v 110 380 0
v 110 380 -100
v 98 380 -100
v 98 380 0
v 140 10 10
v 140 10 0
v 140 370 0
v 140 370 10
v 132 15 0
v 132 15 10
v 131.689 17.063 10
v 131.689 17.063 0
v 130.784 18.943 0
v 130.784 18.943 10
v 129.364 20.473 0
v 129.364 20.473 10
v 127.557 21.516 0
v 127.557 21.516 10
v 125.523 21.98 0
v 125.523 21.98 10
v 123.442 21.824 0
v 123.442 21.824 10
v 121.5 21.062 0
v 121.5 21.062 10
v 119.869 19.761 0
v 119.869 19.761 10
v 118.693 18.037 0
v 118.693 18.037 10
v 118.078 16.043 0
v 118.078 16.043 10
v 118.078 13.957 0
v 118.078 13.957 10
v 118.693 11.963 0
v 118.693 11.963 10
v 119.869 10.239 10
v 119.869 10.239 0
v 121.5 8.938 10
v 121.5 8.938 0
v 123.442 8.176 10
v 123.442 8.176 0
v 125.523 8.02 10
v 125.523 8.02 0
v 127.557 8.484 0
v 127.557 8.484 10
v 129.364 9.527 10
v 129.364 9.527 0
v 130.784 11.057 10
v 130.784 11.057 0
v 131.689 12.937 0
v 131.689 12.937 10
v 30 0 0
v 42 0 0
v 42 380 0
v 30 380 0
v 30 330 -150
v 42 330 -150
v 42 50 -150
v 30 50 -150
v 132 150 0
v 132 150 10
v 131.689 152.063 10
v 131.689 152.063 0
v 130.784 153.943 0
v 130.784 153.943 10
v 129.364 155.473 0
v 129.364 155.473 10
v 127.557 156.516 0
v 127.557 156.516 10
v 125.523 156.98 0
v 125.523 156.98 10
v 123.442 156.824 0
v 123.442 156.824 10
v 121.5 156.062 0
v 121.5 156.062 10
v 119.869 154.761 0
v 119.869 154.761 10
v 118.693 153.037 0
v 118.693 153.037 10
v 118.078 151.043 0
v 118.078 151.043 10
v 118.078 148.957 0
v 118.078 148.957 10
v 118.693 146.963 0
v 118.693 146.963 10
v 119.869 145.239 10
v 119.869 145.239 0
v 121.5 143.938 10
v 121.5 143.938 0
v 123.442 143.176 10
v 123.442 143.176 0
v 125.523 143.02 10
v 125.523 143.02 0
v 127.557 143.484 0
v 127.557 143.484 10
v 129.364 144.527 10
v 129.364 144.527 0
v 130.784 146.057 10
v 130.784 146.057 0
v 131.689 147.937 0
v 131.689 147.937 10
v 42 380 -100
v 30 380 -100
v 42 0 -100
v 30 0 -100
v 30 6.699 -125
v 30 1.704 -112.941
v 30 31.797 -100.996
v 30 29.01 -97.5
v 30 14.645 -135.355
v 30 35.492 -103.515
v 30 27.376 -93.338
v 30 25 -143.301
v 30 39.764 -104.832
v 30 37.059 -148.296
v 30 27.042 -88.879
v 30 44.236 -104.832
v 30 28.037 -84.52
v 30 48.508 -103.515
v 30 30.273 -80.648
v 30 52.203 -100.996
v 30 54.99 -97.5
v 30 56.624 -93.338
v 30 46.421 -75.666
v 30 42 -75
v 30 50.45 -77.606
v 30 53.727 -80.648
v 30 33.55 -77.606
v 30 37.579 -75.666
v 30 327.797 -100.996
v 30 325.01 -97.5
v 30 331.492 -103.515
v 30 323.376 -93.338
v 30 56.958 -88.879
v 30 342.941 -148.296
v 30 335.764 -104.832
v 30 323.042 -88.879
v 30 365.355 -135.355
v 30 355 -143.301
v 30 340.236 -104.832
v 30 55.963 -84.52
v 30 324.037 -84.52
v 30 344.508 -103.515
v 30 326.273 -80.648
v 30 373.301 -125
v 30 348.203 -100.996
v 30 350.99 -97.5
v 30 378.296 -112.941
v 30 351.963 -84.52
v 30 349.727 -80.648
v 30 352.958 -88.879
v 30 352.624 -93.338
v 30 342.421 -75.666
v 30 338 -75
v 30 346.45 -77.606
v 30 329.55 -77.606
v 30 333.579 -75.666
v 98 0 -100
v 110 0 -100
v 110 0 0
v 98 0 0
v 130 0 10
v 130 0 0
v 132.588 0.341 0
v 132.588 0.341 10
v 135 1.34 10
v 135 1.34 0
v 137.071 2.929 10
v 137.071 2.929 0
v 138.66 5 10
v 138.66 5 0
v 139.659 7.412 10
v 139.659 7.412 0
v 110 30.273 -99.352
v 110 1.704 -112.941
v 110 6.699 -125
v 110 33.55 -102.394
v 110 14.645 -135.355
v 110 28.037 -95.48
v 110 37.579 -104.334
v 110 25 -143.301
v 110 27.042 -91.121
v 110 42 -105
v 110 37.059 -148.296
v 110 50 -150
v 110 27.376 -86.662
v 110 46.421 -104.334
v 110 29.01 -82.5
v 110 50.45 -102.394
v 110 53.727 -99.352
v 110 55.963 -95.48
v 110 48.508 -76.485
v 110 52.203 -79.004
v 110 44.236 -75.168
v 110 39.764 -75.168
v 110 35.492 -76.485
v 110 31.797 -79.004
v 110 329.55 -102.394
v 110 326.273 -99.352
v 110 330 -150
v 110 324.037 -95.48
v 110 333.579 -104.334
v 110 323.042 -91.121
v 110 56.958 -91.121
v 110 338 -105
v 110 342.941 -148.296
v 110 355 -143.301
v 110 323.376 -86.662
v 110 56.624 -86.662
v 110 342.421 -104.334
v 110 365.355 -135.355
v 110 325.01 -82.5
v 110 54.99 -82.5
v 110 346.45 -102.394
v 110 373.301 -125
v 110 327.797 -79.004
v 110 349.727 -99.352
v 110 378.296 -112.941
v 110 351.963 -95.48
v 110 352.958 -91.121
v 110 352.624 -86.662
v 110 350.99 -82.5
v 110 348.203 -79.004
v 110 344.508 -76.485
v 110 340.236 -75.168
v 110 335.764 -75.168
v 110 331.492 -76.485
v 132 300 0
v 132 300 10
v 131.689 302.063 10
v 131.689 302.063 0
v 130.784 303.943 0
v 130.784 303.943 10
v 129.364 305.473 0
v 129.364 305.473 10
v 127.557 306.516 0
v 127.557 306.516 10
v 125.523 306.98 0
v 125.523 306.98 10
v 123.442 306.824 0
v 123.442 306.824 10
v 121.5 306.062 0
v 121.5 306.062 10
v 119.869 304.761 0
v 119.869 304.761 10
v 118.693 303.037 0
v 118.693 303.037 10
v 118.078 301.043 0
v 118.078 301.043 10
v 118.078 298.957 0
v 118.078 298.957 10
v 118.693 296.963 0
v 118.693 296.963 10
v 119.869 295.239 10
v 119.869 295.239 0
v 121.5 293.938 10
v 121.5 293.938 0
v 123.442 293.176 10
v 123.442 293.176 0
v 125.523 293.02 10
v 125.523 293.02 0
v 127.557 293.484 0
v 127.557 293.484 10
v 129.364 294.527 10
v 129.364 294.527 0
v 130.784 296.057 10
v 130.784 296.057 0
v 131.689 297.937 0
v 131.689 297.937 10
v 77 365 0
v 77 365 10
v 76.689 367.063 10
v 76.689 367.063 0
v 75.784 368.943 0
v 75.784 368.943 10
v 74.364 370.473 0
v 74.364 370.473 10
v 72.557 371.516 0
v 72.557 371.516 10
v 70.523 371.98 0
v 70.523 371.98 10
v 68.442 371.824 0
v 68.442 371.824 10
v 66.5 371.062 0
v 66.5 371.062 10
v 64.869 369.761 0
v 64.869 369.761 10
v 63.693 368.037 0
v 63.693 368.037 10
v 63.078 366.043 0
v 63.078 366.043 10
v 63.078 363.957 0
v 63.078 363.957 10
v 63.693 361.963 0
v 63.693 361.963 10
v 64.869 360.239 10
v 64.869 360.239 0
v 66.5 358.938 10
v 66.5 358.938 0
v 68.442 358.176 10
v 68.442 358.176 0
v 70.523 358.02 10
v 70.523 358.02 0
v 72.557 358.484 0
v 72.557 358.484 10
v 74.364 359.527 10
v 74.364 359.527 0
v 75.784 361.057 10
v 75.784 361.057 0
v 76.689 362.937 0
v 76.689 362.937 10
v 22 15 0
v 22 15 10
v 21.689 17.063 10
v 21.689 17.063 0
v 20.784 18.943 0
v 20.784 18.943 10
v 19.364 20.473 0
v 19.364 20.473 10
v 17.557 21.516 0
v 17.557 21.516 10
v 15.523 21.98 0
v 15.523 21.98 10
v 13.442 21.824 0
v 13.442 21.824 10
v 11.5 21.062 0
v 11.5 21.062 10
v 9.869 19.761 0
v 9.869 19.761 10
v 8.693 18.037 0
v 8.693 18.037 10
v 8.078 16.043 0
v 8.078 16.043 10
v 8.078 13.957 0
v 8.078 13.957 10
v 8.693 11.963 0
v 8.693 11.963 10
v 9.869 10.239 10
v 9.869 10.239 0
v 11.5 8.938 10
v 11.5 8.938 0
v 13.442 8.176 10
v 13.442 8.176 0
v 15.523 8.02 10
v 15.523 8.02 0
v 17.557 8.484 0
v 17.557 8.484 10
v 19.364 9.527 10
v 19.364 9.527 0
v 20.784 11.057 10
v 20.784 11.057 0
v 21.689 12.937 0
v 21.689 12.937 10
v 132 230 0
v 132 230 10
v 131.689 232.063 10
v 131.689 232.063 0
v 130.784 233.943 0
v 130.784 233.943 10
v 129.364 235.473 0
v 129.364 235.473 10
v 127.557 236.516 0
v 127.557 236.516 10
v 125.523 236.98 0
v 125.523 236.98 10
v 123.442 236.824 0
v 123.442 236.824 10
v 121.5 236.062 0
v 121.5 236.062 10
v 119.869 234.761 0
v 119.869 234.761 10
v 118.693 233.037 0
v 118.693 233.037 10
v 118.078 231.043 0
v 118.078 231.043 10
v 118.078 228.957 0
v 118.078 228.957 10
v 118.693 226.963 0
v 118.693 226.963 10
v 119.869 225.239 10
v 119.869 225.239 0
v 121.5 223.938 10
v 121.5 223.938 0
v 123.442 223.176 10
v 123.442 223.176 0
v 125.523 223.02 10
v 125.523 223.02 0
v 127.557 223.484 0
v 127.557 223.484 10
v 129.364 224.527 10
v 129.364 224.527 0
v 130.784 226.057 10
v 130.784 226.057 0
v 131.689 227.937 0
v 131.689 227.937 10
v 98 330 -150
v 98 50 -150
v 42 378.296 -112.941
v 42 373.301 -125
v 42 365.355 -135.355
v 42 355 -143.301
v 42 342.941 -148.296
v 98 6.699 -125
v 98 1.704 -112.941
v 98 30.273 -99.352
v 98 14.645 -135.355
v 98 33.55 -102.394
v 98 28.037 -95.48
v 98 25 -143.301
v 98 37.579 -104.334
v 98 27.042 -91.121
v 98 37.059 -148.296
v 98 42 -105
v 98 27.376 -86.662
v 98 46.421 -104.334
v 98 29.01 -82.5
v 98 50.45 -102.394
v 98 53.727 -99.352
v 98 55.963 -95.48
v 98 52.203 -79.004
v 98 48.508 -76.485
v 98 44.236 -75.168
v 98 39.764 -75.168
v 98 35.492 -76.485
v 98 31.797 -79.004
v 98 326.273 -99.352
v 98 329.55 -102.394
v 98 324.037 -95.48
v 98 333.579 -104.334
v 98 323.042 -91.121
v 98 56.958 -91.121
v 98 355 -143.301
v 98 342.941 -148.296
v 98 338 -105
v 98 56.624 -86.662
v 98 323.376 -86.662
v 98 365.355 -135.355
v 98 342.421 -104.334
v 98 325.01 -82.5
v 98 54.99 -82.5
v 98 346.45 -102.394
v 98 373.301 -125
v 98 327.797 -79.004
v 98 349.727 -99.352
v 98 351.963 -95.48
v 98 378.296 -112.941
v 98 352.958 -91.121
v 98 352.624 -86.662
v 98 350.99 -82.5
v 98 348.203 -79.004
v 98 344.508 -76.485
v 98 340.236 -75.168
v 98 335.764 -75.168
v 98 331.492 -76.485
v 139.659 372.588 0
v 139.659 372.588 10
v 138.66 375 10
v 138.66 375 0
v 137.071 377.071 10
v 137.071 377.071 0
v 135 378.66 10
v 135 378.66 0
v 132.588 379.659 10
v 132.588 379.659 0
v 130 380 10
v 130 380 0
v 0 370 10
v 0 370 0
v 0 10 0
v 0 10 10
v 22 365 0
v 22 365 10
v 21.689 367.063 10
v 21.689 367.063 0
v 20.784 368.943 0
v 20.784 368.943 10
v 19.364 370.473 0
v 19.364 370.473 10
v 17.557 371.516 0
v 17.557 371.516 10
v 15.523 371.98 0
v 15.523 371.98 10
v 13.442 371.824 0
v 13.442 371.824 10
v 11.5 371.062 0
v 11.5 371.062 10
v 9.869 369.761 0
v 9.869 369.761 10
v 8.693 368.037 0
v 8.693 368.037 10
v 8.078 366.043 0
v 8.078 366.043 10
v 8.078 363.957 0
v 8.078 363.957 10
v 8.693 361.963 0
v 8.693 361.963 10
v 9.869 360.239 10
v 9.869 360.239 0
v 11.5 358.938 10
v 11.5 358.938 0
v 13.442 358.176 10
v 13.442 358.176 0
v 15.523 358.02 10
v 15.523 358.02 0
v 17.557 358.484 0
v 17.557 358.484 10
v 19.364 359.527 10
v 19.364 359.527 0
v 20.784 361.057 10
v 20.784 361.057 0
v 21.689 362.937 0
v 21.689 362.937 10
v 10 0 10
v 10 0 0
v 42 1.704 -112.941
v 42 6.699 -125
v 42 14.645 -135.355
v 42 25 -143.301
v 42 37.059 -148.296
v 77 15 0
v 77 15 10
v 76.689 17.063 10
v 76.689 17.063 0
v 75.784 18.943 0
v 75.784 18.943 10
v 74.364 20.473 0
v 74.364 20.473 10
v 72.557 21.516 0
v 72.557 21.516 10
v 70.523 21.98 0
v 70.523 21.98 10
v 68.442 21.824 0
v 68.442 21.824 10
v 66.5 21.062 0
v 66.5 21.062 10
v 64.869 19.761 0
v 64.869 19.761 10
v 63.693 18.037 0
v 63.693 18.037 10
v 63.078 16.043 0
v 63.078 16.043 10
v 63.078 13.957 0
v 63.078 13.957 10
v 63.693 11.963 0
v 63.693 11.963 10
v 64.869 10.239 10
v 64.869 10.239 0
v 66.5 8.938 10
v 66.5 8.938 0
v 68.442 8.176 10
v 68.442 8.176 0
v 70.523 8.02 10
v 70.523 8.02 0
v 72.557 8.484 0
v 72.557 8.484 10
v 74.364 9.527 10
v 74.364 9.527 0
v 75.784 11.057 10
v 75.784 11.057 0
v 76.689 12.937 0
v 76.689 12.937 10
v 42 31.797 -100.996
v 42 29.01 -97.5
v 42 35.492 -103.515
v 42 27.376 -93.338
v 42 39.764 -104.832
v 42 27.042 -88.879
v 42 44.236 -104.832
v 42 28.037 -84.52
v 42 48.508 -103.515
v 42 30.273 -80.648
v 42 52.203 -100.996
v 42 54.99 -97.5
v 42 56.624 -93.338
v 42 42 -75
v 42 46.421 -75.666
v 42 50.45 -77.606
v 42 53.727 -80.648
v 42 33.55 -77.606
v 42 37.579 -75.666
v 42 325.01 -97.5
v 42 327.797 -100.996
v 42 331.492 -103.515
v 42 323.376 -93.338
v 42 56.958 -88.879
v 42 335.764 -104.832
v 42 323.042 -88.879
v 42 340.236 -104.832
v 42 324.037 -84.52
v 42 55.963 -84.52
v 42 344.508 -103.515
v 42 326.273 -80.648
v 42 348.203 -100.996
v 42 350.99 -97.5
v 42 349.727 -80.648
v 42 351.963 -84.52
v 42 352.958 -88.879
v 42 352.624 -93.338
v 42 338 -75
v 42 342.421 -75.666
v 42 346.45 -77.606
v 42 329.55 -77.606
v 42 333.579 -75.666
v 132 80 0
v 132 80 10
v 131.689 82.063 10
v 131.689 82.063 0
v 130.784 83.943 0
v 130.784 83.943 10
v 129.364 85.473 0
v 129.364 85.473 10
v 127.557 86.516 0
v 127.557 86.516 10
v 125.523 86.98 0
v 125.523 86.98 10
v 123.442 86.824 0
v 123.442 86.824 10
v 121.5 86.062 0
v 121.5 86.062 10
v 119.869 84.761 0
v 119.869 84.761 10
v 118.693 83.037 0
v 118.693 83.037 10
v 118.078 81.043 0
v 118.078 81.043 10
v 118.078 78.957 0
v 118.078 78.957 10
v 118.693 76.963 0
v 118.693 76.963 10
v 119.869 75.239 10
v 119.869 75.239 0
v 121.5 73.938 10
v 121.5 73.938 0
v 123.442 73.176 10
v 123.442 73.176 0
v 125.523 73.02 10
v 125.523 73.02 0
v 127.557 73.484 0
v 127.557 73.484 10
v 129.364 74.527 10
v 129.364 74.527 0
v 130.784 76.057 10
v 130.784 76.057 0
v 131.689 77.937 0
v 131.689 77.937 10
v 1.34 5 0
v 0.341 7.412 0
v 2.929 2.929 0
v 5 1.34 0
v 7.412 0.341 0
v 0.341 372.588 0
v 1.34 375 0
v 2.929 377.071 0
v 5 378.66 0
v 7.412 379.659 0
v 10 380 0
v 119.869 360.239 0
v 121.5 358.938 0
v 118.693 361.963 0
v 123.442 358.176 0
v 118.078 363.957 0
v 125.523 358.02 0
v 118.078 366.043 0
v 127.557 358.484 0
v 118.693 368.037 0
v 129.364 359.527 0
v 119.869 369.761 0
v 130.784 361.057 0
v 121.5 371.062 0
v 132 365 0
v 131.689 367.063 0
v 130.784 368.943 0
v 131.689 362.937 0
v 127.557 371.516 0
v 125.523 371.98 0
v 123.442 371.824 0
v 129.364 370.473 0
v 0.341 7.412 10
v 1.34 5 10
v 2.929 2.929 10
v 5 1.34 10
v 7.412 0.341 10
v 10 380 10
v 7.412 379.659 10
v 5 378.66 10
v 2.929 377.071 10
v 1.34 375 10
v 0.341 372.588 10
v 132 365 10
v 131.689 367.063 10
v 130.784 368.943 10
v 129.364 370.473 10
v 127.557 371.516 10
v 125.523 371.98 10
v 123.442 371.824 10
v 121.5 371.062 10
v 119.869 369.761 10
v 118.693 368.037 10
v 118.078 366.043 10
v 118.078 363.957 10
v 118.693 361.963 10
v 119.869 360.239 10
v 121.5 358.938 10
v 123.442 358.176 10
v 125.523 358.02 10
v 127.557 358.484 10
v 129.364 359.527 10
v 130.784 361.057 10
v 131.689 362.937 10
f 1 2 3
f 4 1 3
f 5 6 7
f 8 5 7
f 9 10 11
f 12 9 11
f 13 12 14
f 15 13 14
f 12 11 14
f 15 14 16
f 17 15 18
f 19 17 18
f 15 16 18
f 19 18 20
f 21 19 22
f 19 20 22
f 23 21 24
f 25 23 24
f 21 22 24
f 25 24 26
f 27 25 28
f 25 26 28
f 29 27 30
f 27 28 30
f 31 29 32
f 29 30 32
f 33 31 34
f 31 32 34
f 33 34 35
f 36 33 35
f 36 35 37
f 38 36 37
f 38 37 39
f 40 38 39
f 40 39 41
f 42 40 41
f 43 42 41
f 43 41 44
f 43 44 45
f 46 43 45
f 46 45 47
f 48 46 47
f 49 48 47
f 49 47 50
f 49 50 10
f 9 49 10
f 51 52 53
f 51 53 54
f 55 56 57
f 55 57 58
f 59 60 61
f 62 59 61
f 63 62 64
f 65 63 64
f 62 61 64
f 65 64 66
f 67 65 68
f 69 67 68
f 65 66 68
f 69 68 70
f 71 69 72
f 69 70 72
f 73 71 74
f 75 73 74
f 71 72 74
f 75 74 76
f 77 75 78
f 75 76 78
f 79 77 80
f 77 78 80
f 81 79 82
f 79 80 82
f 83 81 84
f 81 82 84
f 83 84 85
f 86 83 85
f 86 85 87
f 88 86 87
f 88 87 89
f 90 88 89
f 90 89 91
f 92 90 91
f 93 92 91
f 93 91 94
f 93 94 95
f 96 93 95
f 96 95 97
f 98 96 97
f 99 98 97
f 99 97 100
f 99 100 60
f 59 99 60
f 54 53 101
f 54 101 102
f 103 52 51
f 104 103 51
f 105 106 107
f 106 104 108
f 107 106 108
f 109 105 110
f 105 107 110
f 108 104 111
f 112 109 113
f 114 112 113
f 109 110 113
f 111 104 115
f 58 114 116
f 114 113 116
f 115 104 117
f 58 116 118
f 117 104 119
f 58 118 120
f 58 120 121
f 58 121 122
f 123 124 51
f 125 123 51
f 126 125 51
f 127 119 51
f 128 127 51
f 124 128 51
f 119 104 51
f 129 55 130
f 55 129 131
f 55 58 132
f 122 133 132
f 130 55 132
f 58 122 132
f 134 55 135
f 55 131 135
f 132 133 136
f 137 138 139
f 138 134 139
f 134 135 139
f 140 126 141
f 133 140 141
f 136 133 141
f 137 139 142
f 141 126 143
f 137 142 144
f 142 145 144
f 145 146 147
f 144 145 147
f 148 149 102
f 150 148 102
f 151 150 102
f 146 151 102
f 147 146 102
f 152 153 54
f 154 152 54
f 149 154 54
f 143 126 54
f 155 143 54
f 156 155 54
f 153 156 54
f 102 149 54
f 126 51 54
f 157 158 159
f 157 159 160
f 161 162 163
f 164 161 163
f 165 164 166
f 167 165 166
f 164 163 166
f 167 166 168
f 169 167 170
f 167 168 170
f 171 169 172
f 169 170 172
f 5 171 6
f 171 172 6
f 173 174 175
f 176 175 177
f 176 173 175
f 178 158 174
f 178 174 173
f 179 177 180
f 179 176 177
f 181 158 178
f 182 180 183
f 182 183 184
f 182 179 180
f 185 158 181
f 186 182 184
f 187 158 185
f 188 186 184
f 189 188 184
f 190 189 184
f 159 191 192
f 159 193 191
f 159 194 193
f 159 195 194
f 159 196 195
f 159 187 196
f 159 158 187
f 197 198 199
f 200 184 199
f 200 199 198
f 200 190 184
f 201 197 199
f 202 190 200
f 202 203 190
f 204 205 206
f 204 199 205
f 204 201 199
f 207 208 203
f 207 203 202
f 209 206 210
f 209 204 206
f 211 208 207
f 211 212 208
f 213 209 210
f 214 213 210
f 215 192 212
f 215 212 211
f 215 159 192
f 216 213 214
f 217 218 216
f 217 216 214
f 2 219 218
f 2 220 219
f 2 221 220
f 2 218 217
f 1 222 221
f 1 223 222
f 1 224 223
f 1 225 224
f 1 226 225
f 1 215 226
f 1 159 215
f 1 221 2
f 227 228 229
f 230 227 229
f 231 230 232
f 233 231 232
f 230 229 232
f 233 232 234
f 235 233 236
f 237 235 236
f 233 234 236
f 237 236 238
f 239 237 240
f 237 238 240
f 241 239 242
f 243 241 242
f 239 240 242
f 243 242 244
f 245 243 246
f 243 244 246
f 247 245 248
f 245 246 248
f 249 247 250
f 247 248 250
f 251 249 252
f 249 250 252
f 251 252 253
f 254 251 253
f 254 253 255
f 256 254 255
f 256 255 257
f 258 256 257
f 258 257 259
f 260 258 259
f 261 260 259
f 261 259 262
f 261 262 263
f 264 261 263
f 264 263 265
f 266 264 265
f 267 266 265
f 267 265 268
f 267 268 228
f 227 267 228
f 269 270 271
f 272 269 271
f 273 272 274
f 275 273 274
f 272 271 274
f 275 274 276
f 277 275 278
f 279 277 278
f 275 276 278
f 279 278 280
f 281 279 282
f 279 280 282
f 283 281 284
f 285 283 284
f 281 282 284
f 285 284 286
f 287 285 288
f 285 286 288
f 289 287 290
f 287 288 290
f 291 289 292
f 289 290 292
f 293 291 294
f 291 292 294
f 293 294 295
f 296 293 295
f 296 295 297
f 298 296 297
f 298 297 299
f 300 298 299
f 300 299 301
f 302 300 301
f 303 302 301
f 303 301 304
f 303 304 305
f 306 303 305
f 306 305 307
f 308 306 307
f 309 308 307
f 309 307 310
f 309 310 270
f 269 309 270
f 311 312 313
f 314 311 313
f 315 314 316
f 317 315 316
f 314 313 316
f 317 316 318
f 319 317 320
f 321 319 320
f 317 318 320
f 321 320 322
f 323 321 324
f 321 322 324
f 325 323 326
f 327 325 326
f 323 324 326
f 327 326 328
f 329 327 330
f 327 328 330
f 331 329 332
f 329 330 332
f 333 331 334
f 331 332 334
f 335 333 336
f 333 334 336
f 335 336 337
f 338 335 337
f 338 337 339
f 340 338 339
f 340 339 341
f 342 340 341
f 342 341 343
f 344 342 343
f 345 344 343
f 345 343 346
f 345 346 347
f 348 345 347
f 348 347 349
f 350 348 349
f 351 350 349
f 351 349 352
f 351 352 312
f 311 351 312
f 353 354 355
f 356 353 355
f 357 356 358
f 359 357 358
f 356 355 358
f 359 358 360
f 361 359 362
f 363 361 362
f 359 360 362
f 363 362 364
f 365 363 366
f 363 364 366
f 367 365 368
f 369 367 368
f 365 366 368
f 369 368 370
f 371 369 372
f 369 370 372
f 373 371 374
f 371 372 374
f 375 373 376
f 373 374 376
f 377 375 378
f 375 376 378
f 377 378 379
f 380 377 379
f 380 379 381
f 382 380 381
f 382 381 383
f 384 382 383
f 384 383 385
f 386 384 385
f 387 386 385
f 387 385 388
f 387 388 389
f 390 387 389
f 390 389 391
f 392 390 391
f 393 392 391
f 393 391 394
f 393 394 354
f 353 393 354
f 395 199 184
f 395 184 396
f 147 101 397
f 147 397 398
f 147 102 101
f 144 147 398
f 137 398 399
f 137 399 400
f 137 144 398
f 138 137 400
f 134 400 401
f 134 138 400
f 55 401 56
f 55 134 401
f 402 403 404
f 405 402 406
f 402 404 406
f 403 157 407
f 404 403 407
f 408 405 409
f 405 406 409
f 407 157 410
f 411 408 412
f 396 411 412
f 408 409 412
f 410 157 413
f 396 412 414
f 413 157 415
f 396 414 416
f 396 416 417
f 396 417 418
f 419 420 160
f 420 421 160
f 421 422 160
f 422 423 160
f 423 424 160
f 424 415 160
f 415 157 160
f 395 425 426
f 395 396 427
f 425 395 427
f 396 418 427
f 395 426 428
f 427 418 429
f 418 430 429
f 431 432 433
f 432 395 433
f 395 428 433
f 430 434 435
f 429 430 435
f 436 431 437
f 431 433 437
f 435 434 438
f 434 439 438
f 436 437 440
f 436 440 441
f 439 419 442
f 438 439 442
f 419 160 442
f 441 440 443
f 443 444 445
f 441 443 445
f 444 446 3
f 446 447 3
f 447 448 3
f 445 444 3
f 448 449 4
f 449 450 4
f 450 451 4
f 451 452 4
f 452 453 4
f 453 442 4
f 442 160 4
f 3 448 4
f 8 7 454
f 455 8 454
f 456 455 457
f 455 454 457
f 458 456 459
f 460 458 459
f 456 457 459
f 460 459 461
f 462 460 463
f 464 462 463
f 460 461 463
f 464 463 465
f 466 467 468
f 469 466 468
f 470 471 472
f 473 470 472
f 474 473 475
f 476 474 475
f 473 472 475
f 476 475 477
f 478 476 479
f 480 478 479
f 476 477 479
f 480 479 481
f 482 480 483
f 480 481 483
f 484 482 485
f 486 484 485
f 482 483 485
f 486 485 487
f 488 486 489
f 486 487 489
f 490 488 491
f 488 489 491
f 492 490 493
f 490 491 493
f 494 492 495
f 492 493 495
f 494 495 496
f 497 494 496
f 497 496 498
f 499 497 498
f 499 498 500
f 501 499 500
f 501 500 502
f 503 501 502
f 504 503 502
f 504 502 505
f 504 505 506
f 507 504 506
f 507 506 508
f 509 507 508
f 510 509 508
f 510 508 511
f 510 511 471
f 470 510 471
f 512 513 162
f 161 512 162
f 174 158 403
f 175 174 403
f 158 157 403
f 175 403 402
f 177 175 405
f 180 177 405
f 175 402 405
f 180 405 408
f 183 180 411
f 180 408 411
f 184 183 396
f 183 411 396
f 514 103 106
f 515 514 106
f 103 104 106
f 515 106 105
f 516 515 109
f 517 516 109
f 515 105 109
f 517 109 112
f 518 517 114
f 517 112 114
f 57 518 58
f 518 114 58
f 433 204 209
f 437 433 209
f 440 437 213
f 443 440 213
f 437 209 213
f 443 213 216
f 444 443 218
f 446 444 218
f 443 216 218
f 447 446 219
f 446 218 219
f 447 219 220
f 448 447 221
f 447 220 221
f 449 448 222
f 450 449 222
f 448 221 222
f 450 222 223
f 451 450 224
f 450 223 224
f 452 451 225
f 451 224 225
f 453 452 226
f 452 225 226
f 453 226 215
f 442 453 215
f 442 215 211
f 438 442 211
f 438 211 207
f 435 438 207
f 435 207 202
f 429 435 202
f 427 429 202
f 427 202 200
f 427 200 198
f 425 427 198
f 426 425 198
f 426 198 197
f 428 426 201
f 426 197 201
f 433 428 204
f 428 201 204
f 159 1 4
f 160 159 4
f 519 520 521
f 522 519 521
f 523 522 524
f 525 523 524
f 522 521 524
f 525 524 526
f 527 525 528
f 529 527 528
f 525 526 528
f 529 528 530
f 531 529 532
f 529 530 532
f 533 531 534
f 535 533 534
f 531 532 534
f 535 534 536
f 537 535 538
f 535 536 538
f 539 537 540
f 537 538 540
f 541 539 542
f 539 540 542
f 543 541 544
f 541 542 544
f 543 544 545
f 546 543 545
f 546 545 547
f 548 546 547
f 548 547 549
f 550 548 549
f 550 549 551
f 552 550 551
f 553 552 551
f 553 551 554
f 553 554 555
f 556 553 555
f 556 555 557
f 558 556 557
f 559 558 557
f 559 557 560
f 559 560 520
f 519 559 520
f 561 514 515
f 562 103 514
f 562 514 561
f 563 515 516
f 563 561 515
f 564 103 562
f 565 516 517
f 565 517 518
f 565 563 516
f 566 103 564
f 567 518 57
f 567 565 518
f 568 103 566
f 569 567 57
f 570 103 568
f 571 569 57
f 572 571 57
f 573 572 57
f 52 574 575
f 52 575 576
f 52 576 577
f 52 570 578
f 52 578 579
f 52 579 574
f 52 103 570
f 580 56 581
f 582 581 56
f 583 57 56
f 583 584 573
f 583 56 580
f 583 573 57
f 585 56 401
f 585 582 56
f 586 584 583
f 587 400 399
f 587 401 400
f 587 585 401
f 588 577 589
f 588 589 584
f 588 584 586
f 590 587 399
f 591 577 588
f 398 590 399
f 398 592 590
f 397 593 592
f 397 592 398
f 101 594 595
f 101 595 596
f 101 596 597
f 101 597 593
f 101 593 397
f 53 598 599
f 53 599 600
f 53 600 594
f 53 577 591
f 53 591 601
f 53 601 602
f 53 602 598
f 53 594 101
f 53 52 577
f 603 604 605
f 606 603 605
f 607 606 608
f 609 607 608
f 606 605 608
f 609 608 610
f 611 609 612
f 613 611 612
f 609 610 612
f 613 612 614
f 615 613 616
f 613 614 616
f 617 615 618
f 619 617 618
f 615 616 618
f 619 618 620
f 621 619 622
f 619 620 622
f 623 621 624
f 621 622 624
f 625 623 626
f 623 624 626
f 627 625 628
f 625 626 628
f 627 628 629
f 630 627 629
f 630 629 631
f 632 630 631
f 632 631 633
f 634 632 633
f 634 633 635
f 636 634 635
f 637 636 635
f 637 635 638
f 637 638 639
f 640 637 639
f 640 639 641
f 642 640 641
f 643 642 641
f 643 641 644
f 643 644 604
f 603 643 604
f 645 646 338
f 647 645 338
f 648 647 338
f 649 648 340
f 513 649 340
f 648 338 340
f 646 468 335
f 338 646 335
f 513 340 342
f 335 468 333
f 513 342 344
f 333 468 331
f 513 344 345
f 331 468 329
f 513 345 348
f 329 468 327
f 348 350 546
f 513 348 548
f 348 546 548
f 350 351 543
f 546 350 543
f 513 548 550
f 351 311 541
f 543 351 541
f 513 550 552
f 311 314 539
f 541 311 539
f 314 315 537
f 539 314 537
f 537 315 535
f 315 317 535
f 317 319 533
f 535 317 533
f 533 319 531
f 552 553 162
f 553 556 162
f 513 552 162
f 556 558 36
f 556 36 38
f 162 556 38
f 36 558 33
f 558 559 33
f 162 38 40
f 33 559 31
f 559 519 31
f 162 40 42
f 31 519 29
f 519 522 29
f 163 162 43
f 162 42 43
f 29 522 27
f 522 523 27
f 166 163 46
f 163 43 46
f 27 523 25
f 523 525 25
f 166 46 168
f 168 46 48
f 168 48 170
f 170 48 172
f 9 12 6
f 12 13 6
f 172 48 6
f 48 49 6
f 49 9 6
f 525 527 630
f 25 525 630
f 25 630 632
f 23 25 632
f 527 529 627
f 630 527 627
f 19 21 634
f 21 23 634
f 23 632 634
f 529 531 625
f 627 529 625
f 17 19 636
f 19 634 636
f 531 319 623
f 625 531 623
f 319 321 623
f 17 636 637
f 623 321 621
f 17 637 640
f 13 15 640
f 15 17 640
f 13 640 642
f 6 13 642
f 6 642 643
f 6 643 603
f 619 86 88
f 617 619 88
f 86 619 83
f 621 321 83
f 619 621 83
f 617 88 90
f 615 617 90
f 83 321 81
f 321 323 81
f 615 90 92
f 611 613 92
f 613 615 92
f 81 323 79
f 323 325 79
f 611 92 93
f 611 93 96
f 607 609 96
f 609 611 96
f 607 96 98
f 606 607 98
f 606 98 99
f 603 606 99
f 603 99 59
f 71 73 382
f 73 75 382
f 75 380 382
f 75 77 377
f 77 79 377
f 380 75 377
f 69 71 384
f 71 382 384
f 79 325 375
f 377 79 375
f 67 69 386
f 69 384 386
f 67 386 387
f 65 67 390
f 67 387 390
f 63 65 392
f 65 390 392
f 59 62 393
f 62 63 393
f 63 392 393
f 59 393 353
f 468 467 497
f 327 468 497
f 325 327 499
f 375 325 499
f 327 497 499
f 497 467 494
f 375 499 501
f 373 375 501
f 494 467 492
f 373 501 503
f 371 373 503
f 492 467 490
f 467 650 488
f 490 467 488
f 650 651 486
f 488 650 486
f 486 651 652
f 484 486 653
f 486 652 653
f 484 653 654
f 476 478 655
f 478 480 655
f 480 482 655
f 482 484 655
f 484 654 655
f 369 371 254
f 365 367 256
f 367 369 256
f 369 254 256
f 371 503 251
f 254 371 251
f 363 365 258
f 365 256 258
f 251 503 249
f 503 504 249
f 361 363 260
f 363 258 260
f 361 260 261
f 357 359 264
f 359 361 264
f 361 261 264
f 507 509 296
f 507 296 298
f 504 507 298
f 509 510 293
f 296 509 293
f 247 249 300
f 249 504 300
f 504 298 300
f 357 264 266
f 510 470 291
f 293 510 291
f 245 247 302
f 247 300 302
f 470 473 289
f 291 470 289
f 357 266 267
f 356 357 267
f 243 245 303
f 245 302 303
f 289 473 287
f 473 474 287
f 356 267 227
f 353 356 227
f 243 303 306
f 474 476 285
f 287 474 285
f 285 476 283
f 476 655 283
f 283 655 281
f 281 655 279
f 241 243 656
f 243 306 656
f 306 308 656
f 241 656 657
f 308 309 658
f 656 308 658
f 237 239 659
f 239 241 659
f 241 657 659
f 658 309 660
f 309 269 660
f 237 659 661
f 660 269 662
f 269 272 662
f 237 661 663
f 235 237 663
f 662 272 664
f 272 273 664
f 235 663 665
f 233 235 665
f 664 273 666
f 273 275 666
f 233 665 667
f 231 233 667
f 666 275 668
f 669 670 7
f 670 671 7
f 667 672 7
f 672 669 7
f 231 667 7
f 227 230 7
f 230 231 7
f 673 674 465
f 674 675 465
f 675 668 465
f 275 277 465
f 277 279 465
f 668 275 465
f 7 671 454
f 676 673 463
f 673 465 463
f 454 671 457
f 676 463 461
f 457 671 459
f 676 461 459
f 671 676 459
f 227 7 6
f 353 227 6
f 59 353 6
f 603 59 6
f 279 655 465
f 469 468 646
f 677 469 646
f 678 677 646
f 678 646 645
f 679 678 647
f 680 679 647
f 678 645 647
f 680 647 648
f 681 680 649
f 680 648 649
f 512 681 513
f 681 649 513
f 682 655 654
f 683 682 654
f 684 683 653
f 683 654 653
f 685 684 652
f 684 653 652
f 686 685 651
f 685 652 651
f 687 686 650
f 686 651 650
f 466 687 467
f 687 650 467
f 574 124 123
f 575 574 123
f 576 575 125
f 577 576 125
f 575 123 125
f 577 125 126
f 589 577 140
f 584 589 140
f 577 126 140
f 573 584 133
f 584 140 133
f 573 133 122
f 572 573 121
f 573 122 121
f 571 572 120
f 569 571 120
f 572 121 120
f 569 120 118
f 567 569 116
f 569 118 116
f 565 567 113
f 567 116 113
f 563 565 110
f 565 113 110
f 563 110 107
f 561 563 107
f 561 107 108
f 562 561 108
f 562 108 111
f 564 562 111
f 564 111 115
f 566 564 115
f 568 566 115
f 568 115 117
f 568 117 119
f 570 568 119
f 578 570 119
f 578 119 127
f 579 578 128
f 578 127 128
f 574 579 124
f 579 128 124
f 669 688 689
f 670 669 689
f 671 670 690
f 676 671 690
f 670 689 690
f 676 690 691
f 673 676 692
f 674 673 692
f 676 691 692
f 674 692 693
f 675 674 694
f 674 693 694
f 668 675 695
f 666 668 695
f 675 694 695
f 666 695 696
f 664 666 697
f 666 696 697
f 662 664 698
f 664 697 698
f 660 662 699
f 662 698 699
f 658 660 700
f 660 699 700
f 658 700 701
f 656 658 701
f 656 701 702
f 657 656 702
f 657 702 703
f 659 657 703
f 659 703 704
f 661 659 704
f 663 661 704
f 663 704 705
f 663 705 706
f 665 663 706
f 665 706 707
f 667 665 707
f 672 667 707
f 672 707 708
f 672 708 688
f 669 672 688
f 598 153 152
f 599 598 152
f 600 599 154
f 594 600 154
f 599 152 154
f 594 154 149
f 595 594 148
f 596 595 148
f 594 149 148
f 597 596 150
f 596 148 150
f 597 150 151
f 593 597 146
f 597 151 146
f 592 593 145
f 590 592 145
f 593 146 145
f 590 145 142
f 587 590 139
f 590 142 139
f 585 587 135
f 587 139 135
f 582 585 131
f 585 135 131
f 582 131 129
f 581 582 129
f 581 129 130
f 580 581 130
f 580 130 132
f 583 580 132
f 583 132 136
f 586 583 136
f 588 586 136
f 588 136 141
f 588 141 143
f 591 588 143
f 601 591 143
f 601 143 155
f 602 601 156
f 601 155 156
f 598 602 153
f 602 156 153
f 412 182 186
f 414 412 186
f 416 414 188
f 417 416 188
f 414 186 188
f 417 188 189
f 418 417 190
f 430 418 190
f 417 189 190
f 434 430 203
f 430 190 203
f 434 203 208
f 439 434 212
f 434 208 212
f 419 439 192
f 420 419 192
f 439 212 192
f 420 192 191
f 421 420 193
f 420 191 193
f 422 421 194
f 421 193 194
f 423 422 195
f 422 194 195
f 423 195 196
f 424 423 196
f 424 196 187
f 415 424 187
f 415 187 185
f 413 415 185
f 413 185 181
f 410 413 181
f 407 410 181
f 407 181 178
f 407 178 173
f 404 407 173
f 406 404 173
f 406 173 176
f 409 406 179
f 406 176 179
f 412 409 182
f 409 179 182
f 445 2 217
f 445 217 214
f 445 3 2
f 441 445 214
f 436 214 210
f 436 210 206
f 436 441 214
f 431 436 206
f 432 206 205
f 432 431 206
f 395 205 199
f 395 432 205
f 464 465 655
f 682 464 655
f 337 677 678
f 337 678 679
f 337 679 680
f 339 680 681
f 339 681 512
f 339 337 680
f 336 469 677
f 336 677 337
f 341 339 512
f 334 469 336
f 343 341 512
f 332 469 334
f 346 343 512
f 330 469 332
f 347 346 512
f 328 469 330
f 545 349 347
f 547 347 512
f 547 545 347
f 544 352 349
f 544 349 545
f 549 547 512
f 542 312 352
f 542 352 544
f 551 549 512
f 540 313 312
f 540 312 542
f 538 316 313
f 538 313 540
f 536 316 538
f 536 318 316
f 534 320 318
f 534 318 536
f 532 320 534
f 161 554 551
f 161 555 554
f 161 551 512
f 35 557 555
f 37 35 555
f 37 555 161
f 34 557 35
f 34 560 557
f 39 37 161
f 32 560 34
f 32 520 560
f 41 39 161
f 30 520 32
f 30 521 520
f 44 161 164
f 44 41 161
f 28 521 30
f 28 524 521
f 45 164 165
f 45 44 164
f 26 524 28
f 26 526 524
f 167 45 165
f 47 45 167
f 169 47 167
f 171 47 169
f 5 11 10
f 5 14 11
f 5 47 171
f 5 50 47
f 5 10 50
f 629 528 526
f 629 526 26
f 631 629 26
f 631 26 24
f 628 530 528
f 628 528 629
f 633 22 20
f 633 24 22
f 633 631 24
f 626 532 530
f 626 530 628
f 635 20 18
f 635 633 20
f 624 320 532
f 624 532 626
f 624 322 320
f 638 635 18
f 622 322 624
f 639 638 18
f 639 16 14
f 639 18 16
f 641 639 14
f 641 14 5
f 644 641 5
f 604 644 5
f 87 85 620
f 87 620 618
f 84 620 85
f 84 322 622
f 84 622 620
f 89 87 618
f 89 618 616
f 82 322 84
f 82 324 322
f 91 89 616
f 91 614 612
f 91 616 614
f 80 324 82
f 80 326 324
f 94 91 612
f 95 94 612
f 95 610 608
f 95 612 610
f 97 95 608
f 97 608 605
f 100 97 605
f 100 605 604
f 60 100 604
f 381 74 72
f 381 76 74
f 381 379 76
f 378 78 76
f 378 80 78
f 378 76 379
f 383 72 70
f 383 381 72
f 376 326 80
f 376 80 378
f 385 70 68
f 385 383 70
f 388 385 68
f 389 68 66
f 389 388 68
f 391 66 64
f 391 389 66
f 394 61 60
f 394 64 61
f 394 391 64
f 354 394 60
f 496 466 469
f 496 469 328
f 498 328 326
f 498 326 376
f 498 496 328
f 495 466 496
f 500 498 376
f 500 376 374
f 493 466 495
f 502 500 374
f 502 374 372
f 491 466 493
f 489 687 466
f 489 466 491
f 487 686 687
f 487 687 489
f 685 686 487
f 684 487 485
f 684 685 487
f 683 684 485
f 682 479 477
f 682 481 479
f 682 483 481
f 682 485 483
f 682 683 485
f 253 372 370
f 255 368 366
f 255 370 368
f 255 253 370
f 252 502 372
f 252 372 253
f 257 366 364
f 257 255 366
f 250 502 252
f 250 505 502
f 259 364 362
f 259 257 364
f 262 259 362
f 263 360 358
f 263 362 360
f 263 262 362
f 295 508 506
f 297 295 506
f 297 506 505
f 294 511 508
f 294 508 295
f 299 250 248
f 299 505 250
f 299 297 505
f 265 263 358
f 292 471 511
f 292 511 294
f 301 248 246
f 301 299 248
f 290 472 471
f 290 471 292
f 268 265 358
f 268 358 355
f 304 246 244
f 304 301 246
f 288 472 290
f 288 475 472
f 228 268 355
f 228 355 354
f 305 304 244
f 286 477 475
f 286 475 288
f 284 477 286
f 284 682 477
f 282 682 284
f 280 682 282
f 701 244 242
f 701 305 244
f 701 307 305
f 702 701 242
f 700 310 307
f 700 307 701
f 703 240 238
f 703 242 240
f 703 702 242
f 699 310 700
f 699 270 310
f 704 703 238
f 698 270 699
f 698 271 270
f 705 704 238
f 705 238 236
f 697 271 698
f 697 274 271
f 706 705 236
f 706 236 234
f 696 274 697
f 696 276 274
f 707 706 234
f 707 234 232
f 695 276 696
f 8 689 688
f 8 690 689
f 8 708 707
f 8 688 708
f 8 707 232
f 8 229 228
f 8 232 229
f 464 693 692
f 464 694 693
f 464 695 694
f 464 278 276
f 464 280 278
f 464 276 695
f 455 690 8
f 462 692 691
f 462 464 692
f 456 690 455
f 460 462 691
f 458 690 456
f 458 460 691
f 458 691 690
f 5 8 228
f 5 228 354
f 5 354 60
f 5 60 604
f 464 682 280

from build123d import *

# Parameters (mm, degrees)
EXTRUDE_1_DEPTH     = 10
CUT_EXTRUDE_1_REACH = 12
SKETCH_2_R          = 7
SKETCH_3_W          = 12
SKETCH_3_H          = 380
EXTRUDE_2_DEPTH     = 150
EXTRUDE_2_2_DEPTH   = 150
FILLET_1_R          = 50
FILLET_2_R          = 50
SKETCH_4_R          = 15
CUT_EXTRUDE_2_DEPTH = 12
SKETCH_5_R          = 15
CUT_EXTRUDE_3_DEPTH = 12


with BuildPart() as part:
    # 草图1 → 凸台-拉伸1 (new body)
    with BuildSketch(Plane.XY):
        with BuildLine():
            Line((10, 0), (130, 0))
            ThreePointArc((130, 0), (137.071067812, 2.928932188), (140, 10))
            Line((140, 10), (140, 370))
            ThreePointArc((140, 370), (137.071067812, 377.071067812), (130, 380))
            Line((130, 380), (10, 380))
            ThreePointArc((10, 380), (2.928932188, 377.071067812), (0, 370))
            Line((0, 370), (0, 10))
            ThreePointArc((0, 10), (2.928932188, 2.928932188), (10, 0))
        make_face()
    extrude(amount=EXTRUDE_1_DEPTH)

    # 草图2 → 切除-拉伸1 (cut, up to next)
    with BuildSketch(Plane.XY.offset(10), mode=Mode.PRIVATE) as cut_extrude_1_sk1:
        with Locations((15, 365)):
            Circle(SKETCH_2_R)
    cut_extrude_1_tool1 = extrude(cut_extrude_1_sk1.sketch, amount=-CUT_EXTRUDE_1_REACH, mode=Mode.PRIVATE) & part.part
    add(cut_extrude_1_tool1.solids().sort_by_distance((15, 365, 10))[0], mode=Mode.SUBTRACT)
    # 草图2 → 切除-拉伸1 (cut, up to next)
    with BuildSketch(Plane.XY.offset(10), mode=Mode.PRIVATE) as cut_extrude_1_sk2:
        with Locations((125, 365)):
            Circle(SKETCH_2_R)
    cut_extrude_1_tool2 = extrude(cut_extrude_1_sk2.sketch, amount=-CUT_EXTRUDE_1_REACH, mode=Mode.PRIVATE) & part.part
    add(cut_extrude_1_tool2.solids().sort_by_distance((125, 365, 10))[0], mode=Mode.SUBTRACT)
    # 草图2 → 切除-拉伸1 (cut, up to next)
    with BuildSketch(Plane.XY.offset(10), mode=Mode.PRIVATE) as cut_extrude_1_sk3:
        with Locations((15, 15)):
            Circle(SKETCH_2_R)
    cut_extrude_1_tool3 = extrude(cut_extrude_1_sk3.sketch, amount=-CUT_EXTRUDE_1_REACH, mode=Mode.PRIVATE) & part.part
    add(cut_extrude_1_tool3.solids().sort_by_distance((15, 15, 10))[0], mode=Mode.SUBTRACT)
    # 草图2 → 切除-拉伸1 (cut, up to next)
    with BuildSketch(Plane.XY.offset(10), mode=Mode.PRIVATE) as cut_extrude_1_sk4:
        with Locations((125, 15)):
            Circle(SKETCH_2_R)
    cut_extrude_1_tool4 = extrude(cut_extrude_1_sk4.sketch, amount=-CUT_EXTRUDE_1_REACH, mode=Mode.PRIVATE) & part.part
    add(cut_extrude_1_tool4.solids().sort_by_distance((125, 15, 10))[0], mode=Mode.SUBTRACT)
    # 草图2 → 切除-拉伸1 (cut, up to next)
    with BuildSketch(Plane.XY.offset(10), mode=Mode.PRIVATE) as cut_extrude_1_sk5:
        with Locations((70, 365)):
            Circle(SKETCH_2_R)
    cut_extrude_1_tool5 = extrude(cut_extrude_1_sk5.sketch, amount=-CUT_EXTRUDE_1_REACH, mode=Mode.PRIVATE) & part.part
    add(cut_extrude_1_tool5.solids().sort_by_distance((70, 365, 10))[0], mode=Mode.SUBTRACT)
    # 草图2 → 切除-拉伸1 (cut, up to next)
    with BuildSketch(Plane.XY.offset(10), mode=Mode.PRIVATE) as cut_extrude_1_sk6:
        with Locations((70, 15)):
            Circle(SKETCH_2_R)
    cut_extrude_1_tool6 = extrude(cut_extrude_1_sk6.sketch, amount=-CUT_EXTRUDE_1_REACH, mode=Mode.PRIVATE) & part.part
    add(cut_extrude_1_tool6.solids().sort_by_distance((70, 15, 10))[0], mode=Mode.SUBTRACT)
    # 草图2 → 切除-拉伸1 (cut, up to next)
    with BuildSketch(Plane.XY.offset(10), mode=Mode.PRIVATE) as cut_extrude_1_sk7:
        with Locations((125, 300)):
            Circle(SKETCH_2_R)
    cut_extrude_1_tool7 = extrude(cut_extrude_1_sk7.sketch, amount=-CUT_EXTRUDE_1_REACH, mode=Mode.PRIVATE) & part.part
    add(cut_extrude_1_tool7.solids().sort_by_distance((125, 300, 10))[0], mode=Mode.SUBTRACT)
    # 草图2 → 切除-拉伸1 (cut, up to next)
    with BuildSketch(Plane.XY.offset(10), mode=Mode.PRIVATE) as cut_extrude_1_sk8:
        with Locations((125, 80)):
            Circle(SKETCH_2_R)
    cut_extrude_1_tool8 = extrude(cut_extrude_1_sk8.sketch, amount=-CUT_EXTRUDE_1_REACH, mode=Mode.PRIVATE) & part.part
    add(cut_extrude_1_tool8.solids().sort_by_distance((125, 80, 10))[0], mode=Mode.SUBTRACT)
    # 草图2 → 切除-拉伸1 (cut, up to next)
    with BuildSketch(Plane.XY.offset(10), mode=Mode.PRIVATE) as cut_extrude_1_sk9:
        with Locations((125, 230)):
            Circle(SKETCH_2_R)
    cut_extrude_1_tool9 = extrude(cut_extrude_1_sk9.sketch, amount=-CUT_EXTRUDE_1_REACH, mode=Mode.PRIVATE) & part.part
    add(cut_extrude_1_tool9.solids().sort_by_distance((125, 230, 10))[0], mode=Mode.SUBTRACT)
    # 草图2 → 切除-拉伸1 (cut, up to next)
    with BuildSketch(Plane.XY.offset(10), mode=Mode.PRIVATE) as cut_extrude_1_sk10:
        with Locations((125, 150)):
            Circle(SKETCH_2_R)
    cut_extrude_1_tool10 = extrude(cut_extrude_1_sk10.sketch, amount=-CUT_EXTRUDE_1_REACH, mode=Mode.PRIVATE) & part.part
    add(cut_extrude_1_tool10.solids().sort_by_distance((125, 150, 10))[0], mode=Mode.SUBTRACT)


with BuildPart() as body_2:
    # 草图3 → 凸台-拉伸2 (new body)
    with BuildSketch(Plane(origin=(0, 0, 0), x_dir=(-1, 0, 0), z_dir=(0, 0, -1))):
        with Locations((-104, 190)):
            Rectangle(SKETCH_3_W, SKETCH_3_H)
    extrude(amount=EXTRUDE_2_DEPTH)

    # 圆角1
    fillet_1_edges = [body_2.edges().sort_by_distance(p)[0] for p in [
        (104, 380, -150),
        (104, 0, -150),
    ]]
    fillet(fillet_1_edges, radius=FILLET_1_R)

    # 草图4 → 切除-拉伸2 (cut)
    with BuildSketch(Plane(origin=(110, 0, 0), x_dir=(0, 0, -1), z_dir=(1, 0, 0))):
        with Locations((90, 338)):
            Circle(SKETCH_4_R)
        with Locations((90, 42)):
            Circle(SKETCH_4_R)
    extrude(amount=-CUT_EXTRUDE_2_DEPTH, mode=Mode.SUBTRACT)


with BuildPart() as body_3:
    # 草图3 → Extrude 2 2 (new body)
    with BuildSketch(Plane(origin=(0, 0, 0), x_dir=(-1, 0, 0), z_dir=(0, 0, -1))):
        with Locations((-36, 190)):
            Rectangle(SKETCH_3_W, SKETCH_3_H)
    extrude(amount=EXTRUDE_2_2_DEPTH)

    # 圆角2
    fillet_2_edges = [body_3.edges().sort_by_distance(p)[0] for p in [
        (36, 380, -150),
        (36, 0, -150),
    ]]
    fillet(fillet_2_edges, radius=FILLET_2_R)

    # 草图5 → 切除-拉伸3 (cut)
    with BuildSketch(Plane.ZY.offset(-30)):
        with Locations((-90, 338)):
            Circle(SKETCH_5_R)
        with Locations((-90, 42)):
            Circle(SKETCH_5_R)
    extrude(amount=-CUT_EXTRUDE_3_DEPTH, mode=Mode.SUBTRACT)


solid = Compound([part.part, body_2.part, body_3.part])
